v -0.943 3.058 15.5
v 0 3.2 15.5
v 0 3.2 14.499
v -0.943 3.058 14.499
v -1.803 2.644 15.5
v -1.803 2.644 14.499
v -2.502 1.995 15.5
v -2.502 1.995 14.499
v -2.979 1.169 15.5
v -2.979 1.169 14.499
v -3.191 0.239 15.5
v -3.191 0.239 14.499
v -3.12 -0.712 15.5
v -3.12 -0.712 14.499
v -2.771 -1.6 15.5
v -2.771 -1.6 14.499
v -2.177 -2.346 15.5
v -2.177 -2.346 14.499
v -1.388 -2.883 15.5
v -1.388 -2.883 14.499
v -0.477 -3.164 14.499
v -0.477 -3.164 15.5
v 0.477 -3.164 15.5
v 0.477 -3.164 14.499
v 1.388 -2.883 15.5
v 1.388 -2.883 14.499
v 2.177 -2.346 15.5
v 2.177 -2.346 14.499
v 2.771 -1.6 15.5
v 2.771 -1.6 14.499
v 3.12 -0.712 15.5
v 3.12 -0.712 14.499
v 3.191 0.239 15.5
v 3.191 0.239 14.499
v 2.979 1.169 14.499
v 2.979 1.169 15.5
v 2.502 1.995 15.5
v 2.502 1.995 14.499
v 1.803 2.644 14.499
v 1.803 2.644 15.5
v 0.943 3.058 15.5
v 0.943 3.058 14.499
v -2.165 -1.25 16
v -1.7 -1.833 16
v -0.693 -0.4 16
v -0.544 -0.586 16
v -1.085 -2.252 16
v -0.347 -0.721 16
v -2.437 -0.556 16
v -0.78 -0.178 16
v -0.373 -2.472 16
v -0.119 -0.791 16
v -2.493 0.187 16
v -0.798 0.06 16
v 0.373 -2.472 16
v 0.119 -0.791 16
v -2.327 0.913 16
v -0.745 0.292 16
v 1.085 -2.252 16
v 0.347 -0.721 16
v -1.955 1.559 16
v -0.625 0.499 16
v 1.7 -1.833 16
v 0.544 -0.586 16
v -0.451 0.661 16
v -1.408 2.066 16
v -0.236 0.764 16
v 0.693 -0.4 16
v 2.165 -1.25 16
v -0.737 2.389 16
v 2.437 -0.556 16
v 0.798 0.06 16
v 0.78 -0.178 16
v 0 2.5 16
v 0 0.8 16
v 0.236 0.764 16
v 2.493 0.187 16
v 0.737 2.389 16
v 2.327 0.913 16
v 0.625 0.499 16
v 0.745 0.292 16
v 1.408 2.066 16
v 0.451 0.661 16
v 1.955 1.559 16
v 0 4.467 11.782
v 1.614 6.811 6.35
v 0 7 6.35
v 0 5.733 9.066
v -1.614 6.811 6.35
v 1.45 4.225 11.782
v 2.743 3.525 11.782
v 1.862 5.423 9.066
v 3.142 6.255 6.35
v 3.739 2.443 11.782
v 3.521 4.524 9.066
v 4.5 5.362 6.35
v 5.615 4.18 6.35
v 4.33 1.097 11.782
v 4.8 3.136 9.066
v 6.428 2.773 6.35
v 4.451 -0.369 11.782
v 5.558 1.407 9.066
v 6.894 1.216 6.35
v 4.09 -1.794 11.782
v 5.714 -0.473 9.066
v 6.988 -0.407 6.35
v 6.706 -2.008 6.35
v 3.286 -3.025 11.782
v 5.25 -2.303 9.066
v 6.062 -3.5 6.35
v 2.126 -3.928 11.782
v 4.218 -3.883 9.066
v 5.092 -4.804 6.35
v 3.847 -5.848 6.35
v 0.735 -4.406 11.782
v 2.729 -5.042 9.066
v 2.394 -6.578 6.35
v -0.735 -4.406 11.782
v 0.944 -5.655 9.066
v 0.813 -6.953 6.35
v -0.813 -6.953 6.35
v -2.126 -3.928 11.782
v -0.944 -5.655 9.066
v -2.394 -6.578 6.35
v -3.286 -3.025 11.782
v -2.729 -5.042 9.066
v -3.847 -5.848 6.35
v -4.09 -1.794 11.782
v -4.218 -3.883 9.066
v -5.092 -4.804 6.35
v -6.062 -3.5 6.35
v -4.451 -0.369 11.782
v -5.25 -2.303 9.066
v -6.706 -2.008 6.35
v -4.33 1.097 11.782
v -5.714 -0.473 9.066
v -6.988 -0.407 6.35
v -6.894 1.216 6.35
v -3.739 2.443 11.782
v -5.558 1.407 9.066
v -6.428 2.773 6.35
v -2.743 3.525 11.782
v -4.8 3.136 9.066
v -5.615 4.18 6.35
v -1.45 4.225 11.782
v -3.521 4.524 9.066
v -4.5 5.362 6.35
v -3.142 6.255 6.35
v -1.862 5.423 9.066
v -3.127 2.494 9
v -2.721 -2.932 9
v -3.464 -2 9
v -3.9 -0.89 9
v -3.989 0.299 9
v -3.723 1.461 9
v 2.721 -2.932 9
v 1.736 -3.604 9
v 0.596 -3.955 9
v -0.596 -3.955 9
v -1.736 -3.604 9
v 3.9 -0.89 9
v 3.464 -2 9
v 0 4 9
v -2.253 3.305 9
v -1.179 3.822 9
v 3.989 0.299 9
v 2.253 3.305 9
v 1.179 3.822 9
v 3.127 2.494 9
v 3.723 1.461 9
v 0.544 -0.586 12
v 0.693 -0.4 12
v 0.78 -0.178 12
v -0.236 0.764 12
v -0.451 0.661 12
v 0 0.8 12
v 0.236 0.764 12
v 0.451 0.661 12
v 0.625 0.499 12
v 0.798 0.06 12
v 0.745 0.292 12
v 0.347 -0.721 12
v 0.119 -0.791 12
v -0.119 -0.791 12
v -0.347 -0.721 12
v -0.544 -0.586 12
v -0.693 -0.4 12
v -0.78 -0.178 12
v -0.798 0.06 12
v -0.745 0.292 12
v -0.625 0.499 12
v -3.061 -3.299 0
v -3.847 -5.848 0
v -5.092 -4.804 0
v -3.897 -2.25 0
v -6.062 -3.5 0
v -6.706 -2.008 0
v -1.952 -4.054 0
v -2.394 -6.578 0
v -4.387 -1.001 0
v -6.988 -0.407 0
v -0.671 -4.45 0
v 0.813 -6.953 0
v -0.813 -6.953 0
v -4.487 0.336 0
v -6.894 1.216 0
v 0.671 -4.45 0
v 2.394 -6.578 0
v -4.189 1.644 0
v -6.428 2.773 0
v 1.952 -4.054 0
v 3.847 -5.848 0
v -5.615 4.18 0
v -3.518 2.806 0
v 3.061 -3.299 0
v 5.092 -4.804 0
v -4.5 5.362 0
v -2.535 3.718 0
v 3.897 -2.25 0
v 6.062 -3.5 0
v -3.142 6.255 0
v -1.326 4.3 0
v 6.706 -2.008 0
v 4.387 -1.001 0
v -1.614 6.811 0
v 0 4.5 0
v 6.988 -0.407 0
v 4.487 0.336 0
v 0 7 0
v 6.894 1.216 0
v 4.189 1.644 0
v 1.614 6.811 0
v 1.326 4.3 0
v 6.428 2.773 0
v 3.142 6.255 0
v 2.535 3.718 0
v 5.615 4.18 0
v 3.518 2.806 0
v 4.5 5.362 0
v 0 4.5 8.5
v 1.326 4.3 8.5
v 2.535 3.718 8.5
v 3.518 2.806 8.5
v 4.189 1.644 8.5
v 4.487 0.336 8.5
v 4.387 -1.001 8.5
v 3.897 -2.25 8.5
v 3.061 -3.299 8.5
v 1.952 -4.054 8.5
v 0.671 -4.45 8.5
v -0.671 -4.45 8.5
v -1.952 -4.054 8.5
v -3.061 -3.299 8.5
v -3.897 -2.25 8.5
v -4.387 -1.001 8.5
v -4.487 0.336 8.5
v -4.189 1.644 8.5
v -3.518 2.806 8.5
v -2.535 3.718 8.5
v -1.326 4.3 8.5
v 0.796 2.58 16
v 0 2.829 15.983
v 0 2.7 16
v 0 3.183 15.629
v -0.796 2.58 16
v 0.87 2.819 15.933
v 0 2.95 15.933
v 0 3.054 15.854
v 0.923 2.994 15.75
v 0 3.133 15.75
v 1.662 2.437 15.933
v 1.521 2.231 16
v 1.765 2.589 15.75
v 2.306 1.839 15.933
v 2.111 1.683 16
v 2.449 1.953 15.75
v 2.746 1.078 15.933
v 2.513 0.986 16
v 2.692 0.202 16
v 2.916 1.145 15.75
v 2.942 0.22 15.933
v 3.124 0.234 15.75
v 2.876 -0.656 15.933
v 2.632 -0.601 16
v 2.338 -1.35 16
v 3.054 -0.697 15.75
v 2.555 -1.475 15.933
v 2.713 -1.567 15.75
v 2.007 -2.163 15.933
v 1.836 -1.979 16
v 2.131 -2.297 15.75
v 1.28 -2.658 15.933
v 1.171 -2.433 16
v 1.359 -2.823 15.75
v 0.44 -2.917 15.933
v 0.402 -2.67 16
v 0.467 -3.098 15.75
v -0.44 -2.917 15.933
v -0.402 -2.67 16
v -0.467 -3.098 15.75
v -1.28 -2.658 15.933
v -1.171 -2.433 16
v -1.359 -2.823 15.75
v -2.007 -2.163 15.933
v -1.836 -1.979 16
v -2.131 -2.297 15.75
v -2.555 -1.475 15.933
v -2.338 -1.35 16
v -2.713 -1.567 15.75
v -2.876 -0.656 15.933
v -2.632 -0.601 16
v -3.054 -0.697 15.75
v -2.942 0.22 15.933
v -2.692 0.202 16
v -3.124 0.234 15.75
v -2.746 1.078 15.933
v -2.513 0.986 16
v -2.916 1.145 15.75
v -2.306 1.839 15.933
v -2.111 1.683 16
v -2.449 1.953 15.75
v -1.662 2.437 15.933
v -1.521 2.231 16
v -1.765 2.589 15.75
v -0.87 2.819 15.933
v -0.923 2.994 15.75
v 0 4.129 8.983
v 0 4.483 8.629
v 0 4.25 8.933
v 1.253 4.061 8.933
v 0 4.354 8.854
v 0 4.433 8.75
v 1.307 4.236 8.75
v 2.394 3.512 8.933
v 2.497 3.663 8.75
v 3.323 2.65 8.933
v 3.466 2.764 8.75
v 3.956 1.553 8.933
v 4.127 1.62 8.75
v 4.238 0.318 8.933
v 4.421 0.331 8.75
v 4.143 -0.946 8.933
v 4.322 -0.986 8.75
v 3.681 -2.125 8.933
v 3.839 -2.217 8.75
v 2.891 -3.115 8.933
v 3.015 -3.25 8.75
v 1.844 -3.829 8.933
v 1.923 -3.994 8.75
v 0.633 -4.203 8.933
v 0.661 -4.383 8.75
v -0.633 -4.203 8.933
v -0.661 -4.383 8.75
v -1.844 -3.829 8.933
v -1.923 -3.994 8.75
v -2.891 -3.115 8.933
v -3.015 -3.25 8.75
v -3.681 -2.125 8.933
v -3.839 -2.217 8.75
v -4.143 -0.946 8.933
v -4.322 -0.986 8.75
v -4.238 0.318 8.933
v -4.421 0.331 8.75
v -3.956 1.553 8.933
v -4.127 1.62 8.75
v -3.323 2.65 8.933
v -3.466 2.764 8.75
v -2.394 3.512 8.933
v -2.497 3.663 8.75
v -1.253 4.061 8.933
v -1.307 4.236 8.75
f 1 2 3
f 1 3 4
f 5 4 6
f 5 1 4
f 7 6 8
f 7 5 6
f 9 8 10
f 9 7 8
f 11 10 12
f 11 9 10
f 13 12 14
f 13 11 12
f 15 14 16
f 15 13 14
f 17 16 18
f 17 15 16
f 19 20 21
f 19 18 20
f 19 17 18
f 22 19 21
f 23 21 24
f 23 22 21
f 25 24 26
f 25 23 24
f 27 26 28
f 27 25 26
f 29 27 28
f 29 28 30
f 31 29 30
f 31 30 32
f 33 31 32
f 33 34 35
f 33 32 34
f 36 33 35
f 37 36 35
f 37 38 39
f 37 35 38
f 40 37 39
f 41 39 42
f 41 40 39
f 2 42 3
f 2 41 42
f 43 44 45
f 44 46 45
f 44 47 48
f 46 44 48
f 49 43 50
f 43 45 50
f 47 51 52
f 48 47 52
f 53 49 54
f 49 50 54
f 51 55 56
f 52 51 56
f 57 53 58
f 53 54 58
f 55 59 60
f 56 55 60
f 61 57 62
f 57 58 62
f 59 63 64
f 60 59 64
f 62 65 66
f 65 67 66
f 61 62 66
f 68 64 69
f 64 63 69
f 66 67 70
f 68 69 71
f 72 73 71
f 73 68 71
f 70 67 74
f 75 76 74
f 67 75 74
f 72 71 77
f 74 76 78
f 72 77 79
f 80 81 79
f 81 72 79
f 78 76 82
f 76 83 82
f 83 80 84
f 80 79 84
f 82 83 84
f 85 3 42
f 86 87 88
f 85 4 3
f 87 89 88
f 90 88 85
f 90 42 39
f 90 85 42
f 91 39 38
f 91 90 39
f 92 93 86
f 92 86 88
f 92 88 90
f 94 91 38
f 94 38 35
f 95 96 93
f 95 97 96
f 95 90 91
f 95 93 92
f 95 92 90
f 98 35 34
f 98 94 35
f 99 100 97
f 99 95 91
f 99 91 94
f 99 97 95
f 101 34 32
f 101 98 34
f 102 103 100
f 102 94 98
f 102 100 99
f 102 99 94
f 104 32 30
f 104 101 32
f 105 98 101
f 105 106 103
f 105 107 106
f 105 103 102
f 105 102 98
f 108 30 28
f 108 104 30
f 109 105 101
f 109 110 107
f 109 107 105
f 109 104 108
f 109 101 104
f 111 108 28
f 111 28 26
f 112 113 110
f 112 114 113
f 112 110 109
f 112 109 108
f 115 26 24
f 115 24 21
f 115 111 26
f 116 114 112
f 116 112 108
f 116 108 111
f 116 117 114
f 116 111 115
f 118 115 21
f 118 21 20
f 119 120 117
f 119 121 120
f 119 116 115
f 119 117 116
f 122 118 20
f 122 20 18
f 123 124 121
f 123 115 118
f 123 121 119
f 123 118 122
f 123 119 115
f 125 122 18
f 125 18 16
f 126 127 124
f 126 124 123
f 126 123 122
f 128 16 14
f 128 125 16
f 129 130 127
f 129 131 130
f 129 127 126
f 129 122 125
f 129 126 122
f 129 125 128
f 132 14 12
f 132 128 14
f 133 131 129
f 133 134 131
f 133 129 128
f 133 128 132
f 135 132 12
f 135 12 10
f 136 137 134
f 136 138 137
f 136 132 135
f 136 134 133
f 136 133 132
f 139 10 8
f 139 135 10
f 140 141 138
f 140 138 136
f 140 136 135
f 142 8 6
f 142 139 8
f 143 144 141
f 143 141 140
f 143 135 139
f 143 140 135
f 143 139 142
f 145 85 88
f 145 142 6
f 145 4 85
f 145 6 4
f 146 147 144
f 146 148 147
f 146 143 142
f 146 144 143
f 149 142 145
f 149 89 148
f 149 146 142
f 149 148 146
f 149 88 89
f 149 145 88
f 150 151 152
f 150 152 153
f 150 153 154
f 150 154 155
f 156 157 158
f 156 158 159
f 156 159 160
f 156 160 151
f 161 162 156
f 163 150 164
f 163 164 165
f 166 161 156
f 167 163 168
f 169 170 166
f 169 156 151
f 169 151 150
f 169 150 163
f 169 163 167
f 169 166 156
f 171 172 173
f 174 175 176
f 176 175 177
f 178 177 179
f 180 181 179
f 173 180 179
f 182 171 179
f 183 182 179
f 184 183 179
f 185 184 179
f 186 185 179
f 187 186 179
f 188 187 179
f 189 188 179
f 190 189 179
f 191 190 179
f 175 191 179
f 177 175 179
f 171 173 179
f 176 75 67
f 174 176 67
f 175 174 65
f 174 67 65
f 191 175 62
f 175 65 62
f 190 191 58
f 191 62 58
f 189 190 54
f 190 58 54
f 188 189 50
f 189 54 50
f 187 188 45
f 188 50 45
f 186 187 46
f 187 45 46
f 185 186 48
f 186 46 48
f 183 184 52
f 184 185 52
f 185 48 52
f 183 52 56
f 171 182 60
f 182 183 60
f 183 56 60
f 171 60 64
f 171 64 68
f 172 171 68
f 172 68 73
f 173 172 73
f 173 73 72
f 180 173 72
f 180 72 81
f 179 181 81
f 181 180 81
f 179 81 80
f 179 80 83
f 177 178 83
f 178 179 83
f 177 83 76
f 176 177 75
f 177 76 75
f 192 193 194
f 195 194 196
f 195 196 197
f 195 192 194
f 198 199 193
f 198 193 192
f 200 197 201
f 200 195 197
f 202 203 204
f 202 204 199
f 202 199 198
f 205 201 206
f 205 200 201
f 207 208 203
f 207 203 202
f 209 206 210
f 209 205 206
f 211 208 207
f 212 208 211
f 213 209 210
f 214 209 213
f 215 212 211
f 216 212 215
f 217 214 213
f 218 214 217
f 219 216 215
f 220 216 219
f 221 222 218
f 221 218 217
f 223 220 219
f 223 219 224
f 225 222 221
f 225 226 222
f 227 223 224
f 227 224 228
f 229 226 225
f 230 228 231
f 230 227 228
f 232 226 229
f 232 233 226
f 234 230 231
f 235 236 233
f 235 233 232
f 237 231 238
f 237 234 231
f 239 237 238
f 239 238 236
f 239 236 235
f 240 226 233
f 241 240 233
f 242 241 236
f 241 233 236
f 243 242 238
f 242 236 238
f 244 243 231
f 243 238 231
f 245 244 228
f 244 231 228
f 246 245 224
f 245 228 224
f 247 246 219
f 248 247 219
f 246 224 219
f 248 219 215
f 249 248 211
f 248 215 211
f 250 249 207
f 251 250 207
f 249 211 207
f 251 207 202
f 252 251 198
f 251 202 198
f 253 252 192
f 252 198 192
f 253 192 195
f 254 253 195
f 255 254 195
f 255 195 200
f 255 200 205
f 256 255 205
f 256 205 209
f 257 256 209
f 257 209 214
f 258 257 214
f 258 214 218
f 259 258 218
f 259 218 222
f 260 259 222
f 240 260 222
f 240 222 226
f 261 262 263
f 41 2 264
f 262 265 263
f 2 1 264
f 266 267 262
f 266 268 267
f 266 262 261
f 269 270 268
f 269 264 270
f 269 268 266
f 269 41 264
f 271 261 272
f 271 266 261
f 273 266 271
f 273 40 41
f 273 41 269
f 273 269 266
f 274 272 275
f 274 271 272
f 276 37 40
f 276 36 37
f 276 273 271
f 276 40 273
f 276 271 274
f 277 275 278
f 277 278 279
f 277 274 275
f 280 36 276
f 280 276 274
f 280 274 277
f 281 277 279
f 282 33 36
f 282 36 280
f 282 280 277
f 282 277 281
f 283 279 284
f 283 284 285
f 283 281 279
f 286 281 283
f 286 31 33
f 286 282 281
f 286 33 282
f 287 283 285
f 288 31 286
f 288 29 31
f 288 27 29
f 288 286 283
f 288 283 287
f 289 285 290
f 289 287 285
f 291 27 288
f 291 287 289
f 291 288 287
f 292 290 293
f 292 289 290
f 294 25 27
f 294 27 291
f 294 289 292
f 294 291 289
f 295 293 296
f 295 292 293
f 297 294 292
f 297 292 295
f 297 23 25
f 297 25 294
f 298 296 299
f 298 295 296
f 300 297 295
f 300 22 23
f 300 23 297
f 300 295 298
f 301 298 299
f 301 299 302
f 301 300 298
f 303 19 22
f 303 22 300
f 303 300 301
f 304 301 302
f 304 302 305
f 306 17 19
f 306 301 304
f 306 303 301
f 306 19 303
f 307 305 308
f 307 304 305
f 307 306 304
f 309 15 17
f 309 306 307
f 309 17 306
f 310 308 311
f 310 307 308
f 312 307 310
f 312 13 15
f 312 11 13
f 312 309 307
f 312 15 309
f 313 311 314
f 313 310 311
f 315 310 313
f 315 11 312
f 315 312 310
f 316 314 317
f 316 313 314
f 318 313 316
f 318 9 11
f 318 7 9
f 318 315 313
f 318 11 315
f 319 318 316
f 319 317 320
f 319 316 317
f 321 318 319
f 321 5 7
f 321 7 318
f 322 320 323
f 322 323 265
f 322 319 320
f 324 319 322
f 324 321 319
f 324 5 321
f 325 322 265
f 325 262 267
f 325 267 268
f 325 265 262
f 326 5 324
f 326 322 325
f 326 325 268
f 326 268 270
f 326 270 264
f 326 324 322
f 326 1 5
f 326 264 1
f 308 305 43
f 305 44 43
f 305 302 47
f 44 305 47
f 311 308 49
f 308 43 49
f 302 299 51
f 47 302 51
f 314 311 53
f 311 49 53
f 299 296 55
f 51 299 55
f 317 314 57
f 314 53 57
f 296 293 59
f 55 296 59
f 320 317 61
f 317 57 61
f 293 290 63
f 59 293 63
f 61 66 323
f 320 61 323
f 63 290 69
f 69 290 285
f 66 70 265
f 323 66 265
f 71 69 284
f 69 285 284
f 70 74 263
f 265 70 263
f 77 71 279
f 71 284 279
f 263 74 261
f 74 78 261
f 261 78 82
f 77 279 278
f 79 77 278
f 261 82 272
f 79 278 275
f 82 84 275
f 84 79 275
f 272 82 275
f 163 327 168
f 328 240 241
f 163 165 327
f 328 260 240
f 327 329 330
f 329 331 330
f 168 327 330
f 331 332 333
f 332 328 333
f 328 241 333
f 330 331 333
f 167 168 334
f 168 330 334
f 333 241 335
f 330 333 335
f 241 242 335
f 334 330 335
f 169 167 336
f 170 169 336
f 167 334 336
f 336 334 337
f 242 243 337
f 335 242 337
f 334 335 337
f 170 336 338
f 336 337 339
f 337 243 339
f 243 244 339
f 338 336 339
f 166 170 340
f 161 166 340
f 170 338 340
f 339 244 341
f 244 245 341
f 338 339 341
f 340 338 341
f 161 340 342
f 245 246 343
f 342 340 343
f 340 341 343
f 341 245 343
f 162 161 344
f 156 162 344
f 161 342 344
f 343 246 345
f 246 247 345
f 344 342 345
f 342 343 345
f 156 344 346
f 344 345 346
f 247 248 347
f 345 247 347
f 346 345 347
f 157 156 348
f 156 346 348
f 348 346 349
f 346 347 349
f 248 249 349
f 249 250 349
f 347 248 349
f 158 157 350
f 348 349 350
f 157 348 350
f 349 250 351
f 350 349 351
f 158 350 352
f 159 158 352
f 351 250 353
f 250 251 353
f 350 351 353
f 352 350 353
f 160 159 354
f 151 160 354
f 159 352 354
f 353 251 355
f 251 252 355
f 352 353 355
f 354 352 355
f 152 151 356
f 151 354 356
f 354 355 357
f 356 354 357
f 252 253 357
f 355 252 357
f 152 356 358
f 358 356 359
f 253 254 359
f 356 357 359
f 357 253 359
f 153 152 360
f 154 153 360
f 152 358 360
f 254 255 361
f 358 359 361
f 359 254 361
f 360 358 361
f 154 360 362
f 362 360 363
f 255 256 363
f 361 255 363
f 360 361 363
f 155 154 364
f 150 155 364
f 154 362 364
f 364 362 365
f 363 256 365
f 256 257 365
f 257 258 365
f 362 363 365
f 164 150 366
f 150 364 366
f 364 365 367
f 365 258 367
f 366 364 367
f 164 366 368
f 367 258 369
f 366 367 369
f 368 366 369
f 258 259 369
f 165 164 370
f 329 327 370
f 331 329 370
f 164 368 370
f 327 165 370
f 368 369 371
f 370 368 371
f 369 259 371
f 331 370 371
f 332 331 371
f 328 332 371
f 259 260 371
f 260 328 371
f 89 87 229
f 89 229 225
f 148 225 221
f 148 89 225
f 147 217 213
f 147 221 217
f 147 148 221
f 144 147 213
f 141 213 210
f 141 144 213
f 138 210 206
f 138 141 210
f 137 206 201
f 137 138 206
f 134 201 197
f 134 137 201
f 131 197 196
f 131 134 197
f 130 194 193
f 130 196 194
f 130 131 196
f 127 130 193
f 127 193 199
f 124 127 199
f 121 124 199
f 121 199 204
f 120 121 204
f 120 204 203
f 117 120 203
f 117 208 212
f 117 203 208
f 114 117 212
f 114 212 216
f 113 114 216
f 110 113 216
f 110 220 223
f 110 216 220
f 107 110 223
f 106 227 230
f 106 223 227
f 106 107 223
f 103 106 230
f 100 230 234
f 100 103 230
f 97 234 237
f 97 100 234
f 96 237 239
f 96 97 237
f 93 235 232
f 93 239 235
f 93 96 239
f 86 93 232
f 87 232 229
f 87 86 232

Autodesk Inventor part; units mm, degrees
ref_plane "YZ Plane" through (0, 0, 0) normal (1, 0, 0) x (0, 1, 0)
ref_plane "XZ Plane" through (0, 0, 0) normal (0, 1, 0) x (-1, 0, 0)
ref_plane "XY Plane" through (0, 0, 0) normal (0, 0, 1) x (1, 0, 0)
sketch "Sketch1" plane through (0, 0, 0) normal (1, 0, 0) x (0, 1, 0)
  line L0 (0, 16) -> (2.5, 16) construction
  arc A0 (9.9609, 0) -> (2.5, 16) centre (-28.1983, -8.0544) ccw construction
  line L1 (0, 12) -> (0, 0) construction
  line L2 (2.5, 16) -> (2.5, 16) construction
  line L3 (9.9609, 0) -> (4.5, 0) construction
  line L4 (4.5, 9) -> (0, 9)
  line L5 (4.5, 9) -> (4.5, 0)
  line L6 (0, 12) -> (0, 9)
  line L7 (9.9609, 0) -> (2.5, 16) construction
  line L8 (3.2, 14.4988) -> (3.2, 16)
  line L9 (3.2, 16) -> (2.5, 16)
  line L10 (7, 0) -> (7, 6.3497)
  line L11 (4.5, 0) -> (7, 0)
  line L12 (7, 6.3497) -> (3.2, 14.4988)
  line L13 (0, 12) -> (0.8, 12)
  line L14 (0.8, 12) -> (0.8, 16)
  line L15 (2.5, 16) -> (0.8, 16)
  dimension "d0" = 2.5
  dimension "d5" = 4.5
  dimension "d11" = 9
  dimension "d12" = 16
  dimension "d13" = 115
  dimension "d14" = 3.2
  dimension "d18" = 1.5011
  dimension "d19" = 8.1491
  dimension "d20" = 7
  dimension "d21" = 4
  dimension "d22" = 0.8
revolve "Revolution1" add sketch "Sketch1" angle 360 about axis through (0, 0, 12) along (0, 0, -1)
sketch "Sketch2" plane through (0, 0, 0) normal (1, 0, 0) x (0, 1, 0)
  arc A0 (-2.5, 15) -> (2.5, 15) centre (0, 15) ccw projected
  circle A1 centre (0, 15) radius 1.5
  line L0 (0.6744, 16.3398) -> (-0.6744, 13.6602)
  point P0 (0, 0)
  dimension "d8" = 3
revolve "Revolution2" [suppressed]
fillet "Fillet1" radius 0.5 2 edges at (0, -3.2, 16) (0, -4.5, 9)
properties part number "brush fitting parta"
